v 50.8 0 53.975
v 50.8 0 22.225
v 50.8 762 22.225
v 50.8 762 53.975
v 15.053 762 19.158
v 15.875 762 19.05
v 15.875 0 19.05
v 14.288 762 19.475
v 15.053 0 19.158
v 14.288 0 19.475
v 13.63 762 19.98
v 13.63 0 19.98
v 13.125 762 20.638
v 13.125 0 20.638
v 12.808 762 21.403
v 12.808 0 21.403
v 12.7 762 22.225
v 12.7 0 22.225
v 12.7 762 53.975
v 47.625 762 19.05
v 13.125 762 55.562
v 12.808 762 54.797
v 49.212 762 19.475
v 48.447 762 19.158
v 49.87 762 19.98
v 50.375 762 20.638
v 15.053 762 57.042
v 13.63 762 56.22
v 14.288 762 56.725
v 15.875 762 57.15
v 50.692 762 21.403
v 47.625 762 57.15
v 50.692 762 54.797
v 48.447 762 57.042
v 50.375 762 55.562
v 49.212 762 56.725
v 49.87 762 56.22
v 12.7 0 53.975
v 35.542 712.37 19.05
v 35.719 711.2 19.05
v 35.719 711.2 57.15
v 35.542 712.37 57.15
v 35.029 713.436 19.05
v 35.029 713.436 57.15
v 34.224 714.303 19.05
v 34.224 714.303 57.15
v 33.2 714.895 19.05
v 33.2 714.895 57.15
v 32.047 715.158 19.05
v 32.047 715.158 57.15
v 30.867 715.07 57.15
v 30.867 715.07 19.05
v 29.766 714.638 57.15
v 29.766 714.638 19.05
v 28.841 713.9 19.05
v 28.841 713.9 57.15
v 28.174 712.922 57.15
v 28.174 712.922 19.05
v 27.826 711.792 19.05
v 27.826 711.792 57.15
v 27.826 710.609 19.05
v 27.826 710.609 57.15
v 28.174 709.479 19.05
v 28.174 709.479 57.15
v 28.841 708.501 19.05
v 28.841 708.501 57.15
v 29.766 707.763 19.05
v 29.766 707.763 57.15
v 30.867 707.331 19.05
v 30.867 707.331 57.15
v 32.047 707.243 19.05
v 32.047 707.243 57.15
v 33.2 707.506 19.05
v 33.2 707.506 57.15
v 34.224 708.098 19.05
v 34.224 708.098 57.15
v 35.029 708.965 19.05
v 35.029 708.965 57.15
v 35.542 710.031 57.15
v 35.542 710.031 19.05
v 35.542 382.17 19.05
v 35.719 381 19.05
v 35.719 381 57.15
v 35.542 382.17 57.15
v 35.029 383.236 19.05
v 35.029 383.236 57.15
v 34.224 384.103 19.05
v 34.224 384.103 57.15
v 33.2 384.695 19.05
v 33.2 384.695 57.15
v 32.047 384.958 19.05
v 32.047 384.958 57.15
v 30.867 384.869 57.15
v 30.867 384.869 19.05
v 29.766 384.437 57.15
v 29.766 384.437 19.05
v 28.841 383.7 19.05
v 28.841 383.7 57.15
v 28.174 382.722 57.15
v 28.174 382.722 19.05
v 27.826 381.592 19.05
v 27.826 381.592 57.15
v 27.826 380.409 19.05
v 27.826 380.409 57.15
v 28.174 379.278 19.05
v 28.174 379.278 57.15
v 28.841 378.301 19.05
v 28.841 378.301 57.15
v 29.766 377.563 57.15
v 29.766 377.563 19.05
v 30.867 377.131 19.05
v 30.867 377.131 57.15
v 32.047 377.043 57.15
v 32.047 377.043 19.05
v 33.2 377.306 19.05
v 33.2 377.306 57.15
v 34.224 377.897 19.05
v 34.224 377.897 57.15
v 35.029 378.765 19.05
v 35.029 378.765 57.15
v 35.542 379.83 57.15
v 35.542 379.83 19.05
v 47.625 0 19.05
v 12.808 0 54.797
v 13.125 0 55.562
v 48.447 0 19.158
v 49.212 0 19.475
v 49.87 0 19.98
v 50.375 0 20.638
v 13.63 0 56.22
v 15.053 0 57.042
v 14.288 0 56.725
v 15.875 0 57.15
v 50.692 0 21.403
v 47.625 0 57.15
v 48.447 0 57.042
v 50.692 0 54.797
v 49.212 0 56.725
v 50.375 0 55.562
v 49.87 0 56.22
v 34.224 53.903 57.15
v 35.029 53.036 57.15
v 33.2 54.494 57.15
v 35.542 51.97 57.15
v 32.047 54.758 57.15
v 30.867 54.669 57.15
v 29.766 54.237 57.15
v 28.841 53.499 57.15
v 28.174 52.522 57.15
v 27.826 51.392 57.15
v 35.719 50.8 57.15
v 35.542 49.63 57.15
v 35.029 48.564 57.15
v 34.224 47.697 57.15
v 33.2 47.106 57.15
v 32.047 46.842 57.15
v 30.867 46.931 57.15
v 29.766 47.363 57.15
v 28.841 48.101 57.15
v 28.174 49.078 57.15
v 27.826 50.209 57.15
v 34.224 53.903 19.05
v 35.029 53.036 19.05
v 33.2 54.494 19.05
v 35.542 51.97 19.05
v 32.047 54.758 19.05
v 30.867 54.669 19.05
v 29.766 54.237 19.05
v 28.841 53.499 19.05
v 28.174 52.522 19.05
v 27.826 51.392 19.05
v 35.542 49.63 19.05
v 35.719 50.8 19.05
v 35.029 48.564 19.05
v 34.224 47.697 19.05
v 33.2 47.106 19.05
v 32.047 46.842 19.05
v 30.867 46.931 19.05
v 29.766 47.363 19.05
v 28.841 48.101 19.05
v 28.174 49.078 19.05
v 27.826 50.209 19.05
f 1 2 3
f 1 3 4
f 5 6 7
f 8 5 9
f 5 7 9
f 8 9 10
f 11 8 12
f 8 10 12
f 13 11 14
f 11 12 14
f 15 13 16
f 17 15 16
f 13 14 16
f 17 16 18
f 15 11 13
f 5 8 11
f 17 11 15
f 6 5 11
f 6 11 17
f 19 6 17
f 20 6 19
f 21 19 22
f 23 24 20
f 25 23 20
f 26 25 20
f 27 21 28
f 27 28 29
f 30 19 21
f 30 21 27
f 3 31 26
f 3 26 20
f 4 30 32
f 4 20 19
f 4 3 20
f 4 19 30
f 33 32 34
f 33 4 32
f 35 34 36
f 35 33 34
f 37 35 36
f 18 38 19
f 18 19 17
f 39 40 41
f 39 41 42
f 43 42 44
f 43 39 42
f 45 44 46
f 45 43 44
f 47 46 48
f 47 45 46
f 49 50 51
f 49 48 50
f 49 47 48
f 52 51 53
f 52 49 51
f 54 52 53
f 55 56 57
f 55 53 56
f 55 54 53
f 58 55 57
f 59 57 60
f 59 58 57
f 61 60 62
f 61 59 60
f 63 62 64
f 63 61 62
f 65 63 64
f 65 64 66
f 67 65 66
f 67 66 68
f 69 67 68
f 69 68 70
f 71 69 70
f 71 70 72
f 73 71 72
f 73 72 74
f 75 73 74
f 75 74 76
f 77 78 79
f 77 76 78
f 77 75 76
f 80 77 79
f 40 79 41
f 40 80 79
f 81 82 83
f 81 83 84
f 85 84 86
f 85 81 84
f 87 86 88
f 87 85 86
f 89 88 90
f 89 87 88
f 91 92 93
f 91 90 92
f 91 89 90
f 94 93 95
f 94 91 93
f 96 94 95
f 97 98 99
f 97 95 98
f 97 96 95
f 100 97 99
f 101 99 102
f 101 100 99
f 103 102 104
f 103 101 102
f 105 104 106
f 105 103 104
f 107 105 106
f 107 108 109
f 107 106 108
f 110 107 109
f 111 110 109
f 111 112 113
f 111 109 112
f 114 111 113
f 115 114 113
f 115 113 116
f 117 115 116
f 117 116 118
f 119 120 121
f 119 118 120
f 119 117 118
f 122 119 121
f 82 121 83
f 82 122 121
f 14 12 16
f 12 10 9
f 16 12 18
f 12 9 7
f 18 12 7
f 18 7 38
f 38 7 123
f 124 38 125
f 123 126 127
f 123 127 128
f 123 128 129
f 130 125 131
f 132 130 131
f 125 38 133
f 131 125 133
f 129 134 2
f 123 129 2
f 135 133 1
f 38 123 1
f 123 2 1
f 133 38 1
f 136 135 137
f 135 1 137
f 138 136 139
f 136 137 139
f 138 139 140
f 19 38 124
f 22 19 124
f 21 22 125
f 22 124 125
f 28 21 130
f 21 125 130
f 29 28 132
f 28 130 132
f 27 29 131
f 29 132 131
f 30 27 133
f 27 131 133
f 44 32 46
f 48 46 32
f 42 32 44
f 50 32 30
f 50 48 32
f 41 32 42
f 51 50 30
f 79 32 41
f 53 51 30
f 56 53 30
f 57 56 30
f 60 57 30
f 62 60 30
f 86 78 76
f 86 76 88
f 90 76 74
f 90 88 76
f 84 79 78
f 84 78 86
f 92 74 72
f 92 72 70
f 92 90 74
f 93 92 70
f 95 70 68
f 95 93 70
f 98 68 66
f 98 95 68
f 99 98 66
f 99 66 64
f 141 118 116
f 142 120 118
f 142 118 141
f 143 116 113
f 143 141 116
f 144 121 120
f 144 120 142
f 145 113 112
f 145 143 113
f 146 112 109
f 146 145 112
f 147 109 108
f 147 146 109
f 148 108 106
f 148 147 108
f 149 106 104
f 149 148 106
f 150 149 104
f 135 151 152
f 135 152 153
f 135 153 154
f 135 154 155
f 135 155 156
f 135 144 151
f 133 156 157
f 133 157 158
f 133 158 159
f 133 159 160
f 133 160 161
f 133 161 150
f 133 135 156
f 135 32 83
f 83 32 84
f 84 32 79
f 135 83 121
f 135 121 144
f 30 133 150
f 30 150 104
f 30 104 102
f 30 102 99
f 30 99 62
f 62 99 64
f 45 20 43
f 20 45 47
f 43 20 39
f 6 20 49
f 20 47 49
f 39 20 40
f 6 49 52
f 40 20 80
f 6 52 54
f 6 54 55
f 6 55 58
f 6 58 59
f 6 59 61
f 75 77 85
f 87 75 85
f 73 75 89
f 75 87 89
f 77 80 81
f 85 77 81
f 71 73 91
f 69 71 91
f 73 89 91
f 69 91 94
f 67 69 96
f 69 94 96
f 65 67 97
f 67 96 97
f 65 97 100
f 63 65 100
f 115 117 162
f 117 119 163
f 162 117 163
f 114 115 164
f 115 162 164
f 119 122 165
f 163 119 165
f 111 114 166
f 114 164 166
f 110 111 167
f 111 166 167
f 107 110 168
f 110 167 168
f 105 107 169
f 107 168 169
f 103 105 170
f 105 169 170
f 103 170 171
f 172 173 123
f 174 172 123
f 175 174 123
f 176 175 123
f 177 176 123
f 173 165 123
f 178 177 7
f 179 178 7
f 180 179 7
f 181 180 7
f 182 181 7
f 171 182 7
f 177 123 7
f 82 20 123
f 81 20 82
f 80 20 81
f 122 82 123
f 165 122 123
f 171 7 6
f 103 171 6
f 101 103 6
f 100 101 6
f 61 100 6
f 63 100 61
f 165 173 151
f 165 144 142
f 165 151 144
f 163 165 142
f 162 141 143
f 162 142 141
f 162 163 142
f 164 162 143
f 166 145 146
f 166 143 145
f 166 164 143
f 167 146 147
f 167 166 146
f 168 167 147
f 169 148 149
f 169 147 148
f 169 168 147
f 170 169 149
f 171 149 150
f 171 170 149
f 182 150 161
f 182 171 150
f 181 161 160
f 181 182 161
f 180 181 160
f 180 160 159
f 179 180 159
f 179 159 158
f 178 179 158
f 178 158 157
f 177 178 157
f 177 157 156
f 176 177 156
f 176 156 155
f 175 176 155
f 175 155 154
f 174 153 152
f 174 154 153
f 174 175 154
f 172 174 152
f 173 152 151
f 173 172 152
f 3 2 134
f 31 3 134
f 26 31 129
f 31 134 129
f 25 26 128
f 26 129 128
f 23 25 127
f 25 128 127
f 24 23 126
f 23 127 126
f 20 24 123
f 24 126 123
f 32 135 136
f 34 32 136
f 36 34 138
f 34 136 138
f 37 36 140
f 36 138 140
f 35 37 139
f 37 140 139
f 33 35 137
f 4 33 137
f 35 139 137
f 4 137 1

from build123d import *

# Parameters (mm, degrees)
CYLINDER_R                 = 3.96875
CYLINDER_DEPTH             = 50.8
EXTRUDE015_DEPTH           = 762
EXTRUDE015_PITCH_ANGLE     = -90
EXTRUDE015_PLACEMENT_ANGLE = -90


with BuildPart() as cylinder:
    # Cylinder → Cylinder (new body)
    with BuildSketch(Plane(origin=(381, 203.2, 16.66875), x_dir=(1, 0, 0), z_dir=(0, 0, 1))):
        Circle(CYLINDER_R)
    extrude(amount=CYLINDER_DEPTH)


with BuildPart() as cylinder003:
    # Link054 base: copy of Cylinder
    add(cylinder.part)


with BuildPart() as cylinder003_1:
    # Link054 placement: moved
    add(cylinder003.part.moved(Location((-349.249989, 508.0005, -3.968746))))


with BuildPart() as cylinder002:
    # Link053 base: copy of Cylinder
    add(cylinder.part)


with BuildPart() as cylinder002_1:
    # Link053 placement: moved
    add(cylinder002.part.moved(Location((-349.249989, 177.800183, -3.968753))))


with BuildPart() as cylinder001:
    # Link052 base: copy of Cylinder
    add(cylinder.part)


with BuildPart() as cylinder001_1:
    # Link052 placement: moved
    add(cylinder001.part.moved(Location((-349.250002, -152.399982, -3.968748))))


with BuildPart() as baffle_frame_d:
    # Sketch015 → Extrude015 (new body)
    with BuildSketch(Plane.XY):
        with BuildLine():
            Line((0, 34.925), (0, 3.175))
            ThreePointArc((0, 3.175), (0.929936, 0.929936), (3.175, 0))
            Line((34.925, 0), (3.175, 0))
            ThreePointArc((34.925, 0), (37.170064, 0.929936), (38.1, 3.175))
            Line((38.1, 34.925), (38.1, 3.175))
            ThreePointArc((38.1, 34.925), (37.170064, 37.170064), (34.925, 38.1))
            Line((3.175, 38.1), (34.925, 38.1))
            ThreePointArc((3.175, 38.1), (0.929936, 37.170064), (0, 34.925))
        make_face()
    extrude(amount=EXTRUDE015_DEPTH)


with BuildPart() as baffle_frame_d_1:
    # Extrude015 pitch: moved
    add(baffle_frame_d.part.rotate(Axis((0, 0, 0), (0, 1, 0)), EXTRUDE015_PITCH_ANGLE))


with BuildPart() as baffle_frame_d_2:
    # Extrude015 placement: moved
    add(baffle_frame_d_1.part.moved(Location((12.7, 0, 19.05))).rotate(Axis((12.7, 0, 19.05), (0, 0, 1)), EXTRUDE015_PLACEMENT_ANGLE))

    # Cut001: cut Cylinder001
    add(cylinder001_1.part, mode=Mode.SUBTRACT)

    # Cut002: cut Cylinder002
    add(cylinder002_1.part, mode=Mode.SUBTRACT)

    # Cut003: cut Cylinder003
    add(cylinder003_1.part, mode=Mode.SUBTRACT)


solid = baffle_frame_d_2.part
